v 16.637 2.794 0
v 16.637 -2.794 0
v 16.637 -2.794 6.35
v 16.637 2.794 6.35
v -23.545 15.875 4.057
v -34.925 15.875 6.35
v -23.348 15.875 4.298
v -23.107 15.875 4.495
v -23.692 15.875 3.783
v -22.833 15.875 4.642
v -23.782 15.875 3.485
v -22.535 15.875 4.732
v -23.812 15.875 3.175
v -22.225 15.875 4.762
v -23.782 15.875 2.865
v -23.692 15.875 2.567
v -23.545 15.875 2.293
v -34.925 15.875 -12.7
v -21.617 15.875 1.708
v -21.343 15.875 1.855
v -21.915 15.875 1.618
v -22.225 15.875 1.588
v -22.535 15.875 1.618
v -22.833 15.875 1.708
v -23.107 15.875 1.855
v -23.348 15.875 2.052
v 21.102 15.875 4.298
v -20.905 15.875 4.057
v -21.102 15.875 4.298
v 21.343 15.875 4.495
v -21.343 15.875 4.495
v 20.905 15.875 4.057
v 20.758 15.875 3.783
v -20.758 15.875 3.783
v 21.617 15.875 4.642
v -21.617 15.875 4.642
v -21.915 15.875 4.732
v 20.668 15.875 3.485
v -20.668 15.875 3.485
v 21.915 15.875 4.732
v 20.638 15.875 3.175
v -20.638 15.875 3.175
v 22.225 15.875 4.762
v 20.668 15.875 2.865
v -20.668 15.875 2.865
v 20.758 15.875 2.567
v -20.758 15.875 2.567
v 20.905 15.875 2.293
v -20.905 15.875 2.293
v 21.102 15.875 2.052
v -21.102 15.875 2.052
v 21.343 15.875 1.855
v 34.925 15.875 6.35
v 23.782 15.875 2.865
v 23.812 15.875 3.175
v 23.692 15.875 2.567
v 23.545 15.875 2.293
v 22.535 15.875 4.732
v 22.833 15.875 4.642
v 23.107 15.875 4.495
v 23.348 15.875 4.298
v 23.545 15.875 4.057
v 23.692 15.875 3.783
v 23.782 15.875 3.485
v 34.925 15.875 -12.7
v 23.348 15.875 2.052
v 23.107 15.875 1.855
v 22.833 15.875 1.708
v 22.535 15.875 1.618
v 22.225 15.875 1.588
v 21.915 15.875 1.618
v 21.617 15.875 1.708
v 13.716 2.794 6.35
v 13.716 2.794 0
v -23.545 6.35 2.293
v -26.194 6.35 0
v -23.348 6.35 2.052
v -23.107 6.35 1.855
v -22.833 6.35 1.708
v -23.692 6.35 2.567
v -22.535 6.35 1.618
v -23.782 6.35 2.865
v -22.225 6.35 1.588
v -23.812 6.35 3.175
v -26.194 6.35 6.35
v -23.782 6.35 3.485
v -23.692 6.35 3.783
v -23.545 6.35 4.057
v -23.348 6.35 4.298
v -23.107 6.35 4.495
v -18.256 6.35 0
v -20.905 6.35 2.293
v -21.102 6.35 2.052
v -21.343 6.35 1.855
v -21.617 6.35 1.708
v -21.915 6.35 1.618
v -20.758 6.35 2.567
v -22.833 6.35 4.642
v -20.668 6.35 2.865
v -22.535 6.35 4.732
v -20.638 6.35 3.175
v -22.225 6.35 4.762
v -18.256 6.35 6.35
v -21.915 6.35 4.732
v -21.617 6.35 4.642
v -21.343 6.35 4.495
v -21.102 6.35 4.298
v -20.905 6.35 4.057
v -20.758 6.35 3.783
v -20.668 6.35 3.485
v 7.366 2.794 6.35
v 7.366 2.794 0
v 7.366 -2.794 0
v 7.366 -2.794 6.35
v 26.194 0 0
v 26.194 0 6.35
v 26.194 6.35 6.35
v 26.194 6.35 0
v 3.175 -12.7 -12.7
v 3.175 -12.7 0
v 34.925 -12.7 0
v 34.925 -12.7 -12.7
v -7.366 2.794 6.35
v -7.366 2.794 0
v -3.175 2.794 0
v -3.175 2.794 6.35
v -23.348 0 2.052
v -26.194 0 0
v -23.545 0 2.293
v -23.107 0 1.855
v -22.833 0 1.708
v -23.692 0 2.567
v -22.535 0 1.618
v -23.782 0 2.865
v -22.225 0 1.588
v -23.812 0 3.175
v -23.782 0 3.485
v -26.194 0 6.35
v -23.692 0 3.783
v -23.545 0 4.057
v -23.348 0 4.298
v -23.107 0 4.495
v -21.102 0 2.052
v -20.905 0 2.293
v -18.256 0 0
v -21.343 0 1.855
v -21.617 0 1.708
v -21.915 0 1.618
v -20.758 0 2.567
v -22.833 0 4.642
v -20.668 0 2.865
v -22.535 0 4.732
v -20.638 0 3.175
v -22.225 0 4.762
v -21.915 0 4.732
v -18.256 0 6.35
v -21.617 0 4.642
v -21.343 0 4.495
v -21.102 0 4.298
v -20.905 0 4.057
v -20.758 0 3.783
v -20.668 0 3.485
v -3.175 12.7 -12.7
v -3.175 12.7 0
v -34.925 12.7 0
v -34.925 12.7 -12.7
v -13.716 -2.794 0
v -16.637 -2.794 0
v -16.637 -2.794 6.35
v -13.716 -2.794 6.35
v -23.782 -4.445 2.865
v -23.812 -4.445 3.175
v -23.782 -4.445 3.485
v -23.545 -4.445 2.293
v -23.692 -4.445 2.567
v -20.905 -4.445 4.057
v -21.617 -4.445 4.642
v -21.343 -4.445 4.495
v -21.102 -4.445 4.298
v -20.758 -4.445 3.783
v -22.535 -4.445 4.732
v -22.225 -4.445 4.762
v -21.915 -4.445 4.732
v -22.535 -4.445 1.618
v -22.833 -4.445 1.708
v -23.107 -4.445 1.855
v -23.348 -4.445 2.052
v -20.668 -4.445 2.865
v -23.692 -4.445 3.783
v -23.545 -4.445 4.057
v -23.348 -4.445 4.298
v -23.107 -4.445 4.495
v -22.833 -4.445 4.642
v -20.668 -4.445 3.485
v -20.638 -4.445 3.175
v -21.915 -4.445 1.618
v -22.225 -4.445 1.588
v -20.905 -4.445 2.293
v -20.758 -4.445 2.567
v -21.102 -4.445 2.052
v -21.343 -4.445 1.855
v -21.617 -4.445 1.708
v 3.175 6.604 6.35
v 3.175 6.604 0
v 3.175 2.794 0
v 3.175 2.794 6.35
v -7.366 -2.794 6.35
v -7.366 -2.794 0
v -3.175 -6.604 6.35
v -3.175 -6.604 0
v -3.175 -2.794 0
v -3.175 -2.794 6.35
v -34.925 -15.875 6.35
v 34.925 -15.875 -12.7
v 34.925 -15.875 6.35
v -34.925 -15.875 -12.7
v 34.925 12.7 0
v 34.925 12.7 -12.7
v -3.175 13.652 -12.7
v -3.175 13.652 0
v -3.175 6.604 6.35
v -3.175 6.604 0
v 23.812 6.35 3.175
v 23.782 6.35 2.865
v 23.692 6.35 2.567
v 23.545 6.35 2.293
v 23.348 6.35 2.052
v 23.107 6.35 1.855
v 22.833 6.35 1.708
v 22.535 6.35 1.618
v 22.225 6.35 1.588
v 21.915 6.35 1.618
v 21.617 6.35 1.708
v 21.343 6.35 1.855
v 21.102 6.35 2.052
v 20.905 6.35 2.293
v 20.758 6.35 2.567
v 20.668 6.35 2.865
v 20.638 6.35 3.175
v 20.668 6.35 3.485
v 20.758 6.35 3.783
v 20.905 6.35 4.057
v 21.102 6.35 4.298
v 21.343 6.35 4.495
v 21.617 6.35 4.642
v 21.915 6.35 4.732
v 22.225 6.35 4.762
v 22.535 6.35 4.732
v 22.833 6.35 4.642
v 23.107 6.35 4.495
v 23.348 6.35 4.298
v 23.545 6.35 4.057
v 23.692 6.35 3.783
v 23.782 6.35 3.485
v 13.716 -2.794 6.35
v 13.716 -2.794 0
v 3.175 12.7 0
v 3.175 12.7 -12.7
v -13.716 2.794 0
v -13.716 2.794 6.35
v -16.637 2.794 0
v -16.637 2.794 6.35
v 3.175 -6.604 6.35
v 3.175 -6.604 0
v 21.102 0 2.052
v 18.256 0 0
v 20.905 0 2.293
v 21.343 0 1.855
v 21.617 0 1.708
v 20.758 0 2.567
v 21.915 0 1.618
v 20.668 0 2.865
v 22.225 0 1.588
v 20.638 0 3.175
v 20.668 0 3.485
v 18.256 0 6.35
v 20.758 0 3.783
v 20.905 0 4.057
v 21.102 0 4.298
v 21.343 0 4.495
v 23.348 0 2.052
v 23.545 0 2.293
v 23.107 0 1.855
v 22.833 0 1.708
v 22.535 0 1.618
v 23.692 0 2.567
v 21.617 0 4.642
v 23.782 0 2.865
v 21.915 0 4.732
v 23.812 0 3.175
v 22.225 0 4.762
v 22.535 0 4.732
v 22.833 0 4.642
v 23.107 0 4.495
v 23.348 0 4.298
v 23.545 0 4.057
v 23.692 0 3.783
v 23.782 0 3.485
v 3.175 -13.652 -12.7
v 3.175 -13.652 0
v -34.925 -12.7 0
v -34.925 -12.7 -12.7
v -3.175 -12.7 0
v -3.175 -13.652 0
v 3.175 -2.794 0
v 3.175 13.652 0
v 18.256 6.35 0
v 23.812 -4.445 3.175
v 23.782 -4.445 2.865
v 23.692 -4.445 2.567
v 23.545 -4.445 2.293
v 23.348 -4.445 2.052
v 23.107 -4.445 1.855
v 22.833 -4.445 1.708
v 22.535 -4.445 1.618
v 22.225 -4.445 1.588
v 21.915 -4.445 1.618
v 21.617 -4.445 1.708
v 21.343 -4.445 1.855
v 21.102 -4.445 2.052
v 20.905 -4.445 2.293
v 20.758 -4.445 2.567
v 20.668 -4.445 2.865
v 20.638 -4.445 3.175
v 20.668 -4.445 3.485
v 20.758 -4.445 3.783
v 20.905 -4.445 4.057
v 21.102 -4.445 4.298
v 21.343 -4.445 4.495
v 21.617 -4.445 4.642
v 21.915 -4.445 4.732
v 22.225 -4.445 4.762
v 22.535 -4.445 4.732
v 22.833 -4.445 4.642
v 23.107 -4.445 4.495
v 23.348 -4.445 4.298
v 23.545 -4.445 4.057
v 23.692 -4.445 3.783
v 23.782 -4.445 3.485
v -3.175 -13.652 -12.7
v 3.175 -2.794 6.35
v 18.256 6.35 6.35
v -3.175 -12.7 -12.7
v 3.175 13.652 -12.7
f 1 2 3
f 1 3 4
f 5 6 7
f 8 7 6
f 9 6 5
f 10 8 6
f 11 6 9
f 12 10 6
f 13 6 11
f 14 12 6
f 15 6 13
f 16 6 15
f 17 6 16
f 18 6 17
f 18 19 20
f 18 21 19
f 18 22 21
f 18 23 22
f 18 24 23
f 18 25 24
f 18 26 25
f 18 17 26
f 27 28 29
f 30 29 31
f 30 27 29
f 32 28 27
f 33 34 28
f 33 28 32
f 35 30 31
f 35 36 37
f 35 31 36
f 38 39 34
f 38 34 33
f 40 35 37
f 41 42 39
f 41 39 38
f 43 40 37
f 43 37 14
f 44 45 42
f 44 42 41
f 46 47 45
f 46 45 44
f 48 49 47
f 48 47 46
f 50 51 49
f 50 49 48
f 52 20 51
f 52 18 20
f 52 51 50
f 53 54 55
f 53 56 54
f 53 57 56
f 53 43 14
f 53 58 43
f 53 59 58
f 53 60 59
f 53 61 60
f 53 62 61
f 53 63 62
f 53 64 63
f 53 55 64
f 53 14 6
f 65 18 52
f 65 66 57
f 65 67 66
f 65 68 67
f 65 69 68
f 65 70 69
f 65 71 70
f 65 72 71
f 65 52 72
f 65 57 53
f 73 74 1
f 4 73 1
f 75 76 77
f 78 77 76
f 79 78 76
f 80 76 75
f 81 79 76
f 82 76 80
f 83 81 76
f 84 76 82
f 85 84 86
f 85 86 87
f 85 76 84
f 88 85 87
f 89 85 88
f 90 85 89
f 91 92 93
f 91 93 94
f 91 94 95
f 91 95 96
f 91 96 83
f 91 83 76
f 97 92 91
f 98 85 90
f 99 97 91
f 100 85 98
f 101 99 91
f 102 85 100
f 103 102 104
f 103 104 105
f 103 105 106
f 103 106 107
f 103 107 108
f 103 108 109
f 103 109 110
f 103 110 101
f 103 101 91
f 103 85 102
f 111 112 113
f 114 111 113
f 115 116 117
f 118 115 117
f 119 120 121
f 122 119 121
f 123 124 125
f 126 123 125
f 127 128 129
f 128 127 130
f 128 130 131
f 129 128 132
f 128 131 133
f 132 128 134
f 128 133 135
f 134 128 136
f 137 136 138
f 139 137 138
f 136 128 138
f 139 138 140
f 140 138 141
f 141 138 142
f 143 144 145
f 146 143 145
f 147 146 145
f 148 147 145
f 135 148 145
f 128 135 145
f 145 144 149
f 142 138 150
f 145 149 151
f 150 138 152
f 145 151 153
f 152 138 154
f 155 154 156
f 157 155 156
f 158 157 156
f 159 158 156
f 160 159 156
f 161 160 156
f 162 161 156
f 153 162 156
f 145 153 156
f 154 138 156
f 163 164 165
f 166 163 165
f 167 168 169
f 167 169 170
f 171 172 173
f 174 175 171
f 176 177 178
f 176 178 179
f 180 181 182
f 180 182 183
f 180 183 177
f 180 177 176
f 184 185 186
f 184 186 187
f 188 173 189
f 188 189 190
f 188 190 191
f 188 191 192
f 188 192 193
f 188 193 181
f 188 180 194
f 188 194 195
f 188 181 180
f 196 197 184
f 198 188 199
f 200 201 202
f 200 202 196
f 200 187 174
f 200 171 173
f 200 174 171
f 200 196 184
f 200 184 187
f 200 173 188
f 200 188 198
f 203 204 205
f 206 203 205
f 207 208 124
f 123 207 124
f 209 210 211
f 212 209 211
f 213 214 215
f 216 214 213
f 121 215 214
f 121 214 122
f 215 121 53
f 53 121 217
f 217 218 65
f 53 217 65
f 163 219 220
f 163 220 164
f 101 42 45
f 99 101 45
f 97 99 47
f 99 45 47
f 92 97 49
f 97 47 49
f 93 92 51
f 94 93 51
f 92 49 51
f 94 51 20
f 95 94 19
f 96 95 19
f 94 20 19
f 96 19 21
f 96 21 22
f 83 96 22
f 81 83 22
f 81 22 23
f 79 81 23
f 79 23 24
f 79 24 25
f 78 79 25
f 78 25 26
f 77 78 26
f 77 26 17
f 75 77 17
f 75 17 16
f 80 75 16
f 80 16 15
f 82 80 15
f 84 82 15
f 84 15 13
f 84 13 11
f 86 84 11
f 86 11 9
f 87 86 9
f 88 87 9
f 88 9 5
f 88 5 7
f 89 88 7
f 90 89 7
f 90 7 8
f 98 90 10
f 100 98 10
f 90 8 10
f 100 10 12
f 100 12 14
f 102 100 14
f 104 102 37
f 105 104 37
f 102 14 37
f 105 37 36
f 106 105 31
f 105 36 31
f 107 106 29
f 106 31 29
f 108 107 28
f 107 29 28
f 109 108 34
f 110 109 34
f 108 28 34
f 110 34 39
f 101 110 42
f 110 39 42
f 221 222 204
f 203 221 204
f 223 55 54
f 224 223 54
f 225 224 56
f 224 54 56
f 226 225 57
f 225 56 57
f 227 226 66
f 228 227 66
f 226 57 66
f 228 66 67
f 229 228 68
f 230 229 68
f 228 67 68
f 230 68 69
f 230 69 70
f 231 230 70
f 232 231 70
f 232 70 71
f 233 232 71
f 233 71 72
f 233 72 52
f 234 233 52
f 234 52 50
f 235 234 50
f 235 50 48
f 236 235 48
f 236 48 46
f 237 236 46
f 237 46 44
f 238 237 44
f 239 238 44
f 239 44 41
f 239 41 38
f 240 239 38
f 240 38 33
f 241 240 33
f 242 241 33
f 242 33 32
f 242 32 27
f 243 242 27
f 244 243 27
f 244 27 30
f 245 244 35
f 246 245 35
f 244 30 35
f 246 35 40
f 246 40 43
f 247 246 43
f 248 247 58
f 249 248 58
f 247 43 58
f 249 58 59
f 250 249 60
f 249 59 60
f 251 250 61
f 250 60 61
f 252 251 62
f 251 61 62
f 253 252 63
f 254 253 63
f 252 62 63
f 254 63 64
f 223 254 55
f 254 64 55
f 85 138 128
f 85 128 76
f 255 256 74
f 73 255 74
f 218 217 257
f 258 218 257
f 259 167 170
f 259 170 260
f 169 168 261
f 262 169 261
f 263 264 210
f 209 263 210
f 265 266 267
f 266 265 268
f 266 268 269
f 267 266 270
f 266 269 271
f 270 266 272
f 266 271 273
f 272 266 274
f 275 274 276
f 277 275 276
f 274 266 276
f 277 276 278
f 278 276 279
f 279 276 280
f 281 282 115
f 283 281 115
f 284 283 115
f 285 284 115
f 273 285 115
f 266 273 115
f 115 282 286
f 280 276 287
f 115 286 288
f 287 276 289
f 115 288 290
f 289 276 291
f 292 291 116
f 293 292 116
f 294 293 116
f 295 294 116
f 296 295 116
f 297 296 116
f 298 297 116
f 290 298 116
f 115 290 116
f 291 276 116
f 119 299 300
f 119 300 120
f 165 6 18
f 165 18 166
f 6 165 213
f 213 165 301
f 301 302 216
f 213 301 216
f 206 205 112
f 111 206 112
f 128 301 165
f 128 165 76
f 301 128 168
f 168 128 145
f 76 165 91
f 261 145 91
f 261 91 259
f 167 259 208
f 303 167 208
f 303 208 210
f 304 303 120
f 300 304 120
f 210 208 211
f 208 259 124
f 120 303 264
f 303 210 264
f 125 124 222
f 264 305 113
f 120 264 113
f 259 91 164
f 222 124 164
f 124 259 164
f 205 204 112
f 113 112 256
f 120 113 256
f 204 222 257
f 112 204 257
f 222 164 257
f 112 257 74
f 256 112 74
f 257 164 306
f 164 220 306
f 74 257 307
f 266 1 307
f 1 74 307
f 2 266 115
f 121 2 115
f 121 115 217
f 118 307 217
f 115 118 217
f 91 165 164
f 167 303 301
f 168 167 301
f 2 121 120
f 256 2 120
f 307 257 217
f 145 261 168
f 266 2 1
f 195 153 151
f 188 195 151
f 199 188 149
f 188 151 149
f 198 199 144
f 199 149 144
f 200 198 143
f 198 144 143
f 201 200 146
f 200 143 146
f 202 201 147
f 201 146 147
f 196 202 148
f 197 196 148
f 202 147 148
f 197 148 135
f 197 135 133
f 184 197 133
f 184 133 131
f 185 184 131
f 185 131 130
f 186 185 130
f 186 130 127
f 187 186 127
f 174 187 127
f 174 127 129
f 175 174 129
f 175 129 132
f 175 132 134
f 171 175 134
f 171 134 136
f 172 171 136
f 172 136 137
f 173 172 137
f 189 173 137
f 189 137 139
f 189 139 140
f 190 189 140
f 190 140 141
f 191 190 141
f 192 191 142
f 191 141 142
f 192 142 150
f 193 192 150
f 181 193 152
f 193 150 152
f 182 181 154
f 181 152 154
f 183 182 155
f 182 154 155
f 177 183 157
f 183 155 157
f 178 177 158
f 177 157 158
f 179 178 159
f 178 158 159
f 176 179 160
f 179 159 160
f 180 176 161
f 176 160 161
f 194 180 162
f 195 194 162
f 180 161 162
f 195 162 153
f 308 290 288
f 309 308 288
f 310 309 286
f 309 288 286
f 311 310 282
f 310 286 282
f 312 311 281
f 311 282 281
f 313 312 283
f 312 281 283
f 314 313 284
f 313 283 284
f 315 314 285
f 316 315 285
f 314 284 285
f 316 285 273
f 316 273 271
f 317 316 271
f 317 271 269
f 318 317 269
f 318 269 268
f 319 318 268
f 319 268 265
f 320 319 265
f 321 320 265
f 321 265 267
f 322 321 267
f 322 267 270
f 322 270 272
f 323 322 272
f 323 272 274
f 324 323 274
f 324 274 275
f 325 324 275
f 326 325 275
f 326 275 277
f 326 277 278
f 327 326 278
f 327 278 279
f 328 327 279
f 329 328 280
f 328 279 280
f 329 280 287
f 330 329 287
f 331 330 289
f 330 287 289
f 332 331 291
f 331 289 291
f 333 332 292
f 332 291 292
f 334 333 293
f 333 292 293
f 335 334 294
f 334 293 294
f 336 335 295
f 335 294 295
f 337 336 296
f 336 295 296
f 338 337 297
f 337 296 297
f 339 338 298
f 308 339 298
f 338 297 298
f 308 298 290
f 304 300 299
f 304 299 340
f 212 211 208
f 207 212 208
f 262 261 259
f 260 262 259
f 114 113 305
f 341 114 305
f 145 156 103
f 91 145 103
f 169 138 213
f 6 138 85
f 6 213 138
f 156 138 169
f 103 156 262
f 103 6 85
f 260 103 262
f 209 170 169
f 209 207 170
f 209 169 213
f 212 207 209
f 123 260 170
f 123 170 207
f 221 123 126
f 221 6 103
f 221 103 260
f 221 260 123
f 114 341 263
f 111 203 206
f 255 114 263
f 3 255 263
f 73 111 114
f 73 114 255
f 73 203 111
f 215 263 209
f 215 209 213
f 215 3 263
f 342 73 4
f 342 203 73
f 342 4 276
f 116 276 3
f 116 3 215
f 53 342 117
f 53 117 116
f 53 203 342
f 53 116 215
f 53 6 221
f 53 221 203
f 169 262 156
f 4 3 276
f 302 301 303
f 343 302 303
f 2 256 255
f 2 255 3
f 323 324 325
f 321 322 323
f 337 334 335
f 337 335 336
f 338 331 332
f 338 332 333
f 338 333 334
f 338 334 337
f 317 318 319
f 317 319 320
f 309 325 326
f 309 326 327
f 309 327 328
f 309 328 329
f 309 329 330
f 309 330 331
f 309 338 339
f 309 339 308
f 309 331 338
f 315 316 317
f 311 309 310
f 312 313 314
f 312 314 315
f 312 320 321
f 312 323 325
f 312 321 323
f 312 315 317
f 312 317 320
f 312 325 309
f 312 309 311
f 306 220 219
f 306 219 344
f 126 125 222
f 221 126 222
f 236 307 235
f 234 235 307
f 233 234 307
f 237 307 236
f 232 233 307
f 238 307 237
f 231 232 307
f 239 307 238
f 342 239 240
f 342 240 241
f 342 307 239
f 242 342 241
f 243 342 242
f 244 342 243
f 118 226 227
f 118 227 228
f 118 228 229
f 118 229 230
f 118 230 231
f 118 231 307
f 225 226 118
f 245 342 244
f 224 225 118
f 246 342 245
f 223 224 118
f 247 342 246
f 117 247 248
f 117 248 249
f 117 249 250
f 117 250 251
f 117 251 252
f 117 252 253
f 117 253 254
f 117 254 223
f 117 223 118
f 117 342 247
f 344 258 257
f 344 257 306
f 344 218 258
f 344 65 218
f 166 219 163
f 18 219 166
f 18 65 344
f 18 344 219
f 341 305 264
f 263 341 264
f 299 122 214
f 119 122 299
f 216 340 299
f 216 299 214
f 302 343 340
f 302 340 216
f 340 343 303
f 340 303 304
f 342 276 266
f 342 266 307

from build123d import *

# Parameters (mm, degrees)
BOSS_EXTRUDE1_DEPTH   = 12.7
BOSS_EXTRUDE1_2_DEPTH = 12.7
SKETCH1_3_W           = 69.85
SKETCH1_3_H           = 31.75
SKETCH1_3_W_2         = 2.921
SKETCH1_3_H_2         = 5.588
BOSS_EXTRUDE2_DEPTH   = 6.35
SKETCH3_R             = 1.5875
CUT_EXTRUDE1_DEPTH    = 20.32
SKETCH4_W             = 7.9375
SKETCH4_H             = 6.35
CUT_EXTRUDE2_DEPTH    = 6.35


with BuildPart() as part:
    # Sketch1 → Boss-Extrude1 (new body)
    with BuildSketch(Plane.XY):
        Polygon((-3.175, -13.6525), (-3.175, -12.7), (-34.925, -12.7), (-34.925, -15.875), (34.925, -15.875), (34.925, -12.7), (3.175, -12.7), (3.175, -13.6525), align=None)
    extrude(amount=-BOSS_EXTRUDE1_DEPTH)



with BuildPart() as body_2:
    # Sketch1 → Boss-Extrude1 2 (new body)
    with BuildSketch(Plane.XY):
        Polygon((-34.925, 15.875), (-34.925, 12.7), (-3.175, 12.7), (-3.175, 13.6525), (3.175, 13.6525), (3.175, 12.7), (34.925, 12.7), (34.925, 15.875), align=None)
    extrude(amount=-BOSS_EXTRUDE1_2_DEPTH)


with BuildPart() as part_1:
    add(part.part)

    add(body_2.part)  # Boss-Extrude2 merges body 2
    # Sketch1<3> → Boss-Extrude2 (add)
    with BuildSketch(Plane.XY):
        Rectangle(SKETCH1_3_W, SKETCH1_3_H)
        with Locations((15.1765, 0)):
            Rectangle(SKETCH1_3_W_2, SKETCH1_3_H_2, mode=Mode.SUBTRACT)
        with Locations((-15.1765, 0)):
            Rectangle(SKETCH1_3_W_2, SKETCH1_3_H_2, mode=Mode.SUBTRACT)
        Polygon((3.175, -6.604), (-3.175, -6.604), (-3.175, -2.794), (-7.366, -2.794), (-7.366, 2.794), (-3.175, 2.794), (-3.175, 6.604), (3.175, 6.604), (3.175, 2.794), (7.366, 2.794), (7.366, -2.794), (3.175, -2.794), align=None, mode=Mode.SUBTRACT)
    extrude(amount=BOSS_EXTRUDE2_DEPTH)

    # Sketch3 → Cut-Extrude1 (cut)
    with BuildSketch(Plane(origin=(0, 15.875, 0), x_dir=(1, 0, 0), z_dir=(0, 1, 0))):
        with Locations((22.225, -3.175)):
            Circle(SKETCH3_R)
        with Locations((-22.225, -3.175)):
            Circle(SKETCH3_R)
    extrude(amount=-CUT_EXTRUDE1_DEPTH, mode=Mode.SUBTRACT)

    # Sketch4 → Cut-Extrude2 (cut)
    with BuildSketch(Plane.XY.offset(6.35)):
        with Locations((-22.225, 3.175)):
            Rectangle(SKETCH4_W, SKETCH4_H)
        with Locations((22.225, 3.175)):
            Rectangle(SKETCH4_W, SKETCH4_H)
    extrude(amount=-CUT_EXTRUDE2_DEPTH, mode=Mode.SUBTRACT)


solid = part_1.part
